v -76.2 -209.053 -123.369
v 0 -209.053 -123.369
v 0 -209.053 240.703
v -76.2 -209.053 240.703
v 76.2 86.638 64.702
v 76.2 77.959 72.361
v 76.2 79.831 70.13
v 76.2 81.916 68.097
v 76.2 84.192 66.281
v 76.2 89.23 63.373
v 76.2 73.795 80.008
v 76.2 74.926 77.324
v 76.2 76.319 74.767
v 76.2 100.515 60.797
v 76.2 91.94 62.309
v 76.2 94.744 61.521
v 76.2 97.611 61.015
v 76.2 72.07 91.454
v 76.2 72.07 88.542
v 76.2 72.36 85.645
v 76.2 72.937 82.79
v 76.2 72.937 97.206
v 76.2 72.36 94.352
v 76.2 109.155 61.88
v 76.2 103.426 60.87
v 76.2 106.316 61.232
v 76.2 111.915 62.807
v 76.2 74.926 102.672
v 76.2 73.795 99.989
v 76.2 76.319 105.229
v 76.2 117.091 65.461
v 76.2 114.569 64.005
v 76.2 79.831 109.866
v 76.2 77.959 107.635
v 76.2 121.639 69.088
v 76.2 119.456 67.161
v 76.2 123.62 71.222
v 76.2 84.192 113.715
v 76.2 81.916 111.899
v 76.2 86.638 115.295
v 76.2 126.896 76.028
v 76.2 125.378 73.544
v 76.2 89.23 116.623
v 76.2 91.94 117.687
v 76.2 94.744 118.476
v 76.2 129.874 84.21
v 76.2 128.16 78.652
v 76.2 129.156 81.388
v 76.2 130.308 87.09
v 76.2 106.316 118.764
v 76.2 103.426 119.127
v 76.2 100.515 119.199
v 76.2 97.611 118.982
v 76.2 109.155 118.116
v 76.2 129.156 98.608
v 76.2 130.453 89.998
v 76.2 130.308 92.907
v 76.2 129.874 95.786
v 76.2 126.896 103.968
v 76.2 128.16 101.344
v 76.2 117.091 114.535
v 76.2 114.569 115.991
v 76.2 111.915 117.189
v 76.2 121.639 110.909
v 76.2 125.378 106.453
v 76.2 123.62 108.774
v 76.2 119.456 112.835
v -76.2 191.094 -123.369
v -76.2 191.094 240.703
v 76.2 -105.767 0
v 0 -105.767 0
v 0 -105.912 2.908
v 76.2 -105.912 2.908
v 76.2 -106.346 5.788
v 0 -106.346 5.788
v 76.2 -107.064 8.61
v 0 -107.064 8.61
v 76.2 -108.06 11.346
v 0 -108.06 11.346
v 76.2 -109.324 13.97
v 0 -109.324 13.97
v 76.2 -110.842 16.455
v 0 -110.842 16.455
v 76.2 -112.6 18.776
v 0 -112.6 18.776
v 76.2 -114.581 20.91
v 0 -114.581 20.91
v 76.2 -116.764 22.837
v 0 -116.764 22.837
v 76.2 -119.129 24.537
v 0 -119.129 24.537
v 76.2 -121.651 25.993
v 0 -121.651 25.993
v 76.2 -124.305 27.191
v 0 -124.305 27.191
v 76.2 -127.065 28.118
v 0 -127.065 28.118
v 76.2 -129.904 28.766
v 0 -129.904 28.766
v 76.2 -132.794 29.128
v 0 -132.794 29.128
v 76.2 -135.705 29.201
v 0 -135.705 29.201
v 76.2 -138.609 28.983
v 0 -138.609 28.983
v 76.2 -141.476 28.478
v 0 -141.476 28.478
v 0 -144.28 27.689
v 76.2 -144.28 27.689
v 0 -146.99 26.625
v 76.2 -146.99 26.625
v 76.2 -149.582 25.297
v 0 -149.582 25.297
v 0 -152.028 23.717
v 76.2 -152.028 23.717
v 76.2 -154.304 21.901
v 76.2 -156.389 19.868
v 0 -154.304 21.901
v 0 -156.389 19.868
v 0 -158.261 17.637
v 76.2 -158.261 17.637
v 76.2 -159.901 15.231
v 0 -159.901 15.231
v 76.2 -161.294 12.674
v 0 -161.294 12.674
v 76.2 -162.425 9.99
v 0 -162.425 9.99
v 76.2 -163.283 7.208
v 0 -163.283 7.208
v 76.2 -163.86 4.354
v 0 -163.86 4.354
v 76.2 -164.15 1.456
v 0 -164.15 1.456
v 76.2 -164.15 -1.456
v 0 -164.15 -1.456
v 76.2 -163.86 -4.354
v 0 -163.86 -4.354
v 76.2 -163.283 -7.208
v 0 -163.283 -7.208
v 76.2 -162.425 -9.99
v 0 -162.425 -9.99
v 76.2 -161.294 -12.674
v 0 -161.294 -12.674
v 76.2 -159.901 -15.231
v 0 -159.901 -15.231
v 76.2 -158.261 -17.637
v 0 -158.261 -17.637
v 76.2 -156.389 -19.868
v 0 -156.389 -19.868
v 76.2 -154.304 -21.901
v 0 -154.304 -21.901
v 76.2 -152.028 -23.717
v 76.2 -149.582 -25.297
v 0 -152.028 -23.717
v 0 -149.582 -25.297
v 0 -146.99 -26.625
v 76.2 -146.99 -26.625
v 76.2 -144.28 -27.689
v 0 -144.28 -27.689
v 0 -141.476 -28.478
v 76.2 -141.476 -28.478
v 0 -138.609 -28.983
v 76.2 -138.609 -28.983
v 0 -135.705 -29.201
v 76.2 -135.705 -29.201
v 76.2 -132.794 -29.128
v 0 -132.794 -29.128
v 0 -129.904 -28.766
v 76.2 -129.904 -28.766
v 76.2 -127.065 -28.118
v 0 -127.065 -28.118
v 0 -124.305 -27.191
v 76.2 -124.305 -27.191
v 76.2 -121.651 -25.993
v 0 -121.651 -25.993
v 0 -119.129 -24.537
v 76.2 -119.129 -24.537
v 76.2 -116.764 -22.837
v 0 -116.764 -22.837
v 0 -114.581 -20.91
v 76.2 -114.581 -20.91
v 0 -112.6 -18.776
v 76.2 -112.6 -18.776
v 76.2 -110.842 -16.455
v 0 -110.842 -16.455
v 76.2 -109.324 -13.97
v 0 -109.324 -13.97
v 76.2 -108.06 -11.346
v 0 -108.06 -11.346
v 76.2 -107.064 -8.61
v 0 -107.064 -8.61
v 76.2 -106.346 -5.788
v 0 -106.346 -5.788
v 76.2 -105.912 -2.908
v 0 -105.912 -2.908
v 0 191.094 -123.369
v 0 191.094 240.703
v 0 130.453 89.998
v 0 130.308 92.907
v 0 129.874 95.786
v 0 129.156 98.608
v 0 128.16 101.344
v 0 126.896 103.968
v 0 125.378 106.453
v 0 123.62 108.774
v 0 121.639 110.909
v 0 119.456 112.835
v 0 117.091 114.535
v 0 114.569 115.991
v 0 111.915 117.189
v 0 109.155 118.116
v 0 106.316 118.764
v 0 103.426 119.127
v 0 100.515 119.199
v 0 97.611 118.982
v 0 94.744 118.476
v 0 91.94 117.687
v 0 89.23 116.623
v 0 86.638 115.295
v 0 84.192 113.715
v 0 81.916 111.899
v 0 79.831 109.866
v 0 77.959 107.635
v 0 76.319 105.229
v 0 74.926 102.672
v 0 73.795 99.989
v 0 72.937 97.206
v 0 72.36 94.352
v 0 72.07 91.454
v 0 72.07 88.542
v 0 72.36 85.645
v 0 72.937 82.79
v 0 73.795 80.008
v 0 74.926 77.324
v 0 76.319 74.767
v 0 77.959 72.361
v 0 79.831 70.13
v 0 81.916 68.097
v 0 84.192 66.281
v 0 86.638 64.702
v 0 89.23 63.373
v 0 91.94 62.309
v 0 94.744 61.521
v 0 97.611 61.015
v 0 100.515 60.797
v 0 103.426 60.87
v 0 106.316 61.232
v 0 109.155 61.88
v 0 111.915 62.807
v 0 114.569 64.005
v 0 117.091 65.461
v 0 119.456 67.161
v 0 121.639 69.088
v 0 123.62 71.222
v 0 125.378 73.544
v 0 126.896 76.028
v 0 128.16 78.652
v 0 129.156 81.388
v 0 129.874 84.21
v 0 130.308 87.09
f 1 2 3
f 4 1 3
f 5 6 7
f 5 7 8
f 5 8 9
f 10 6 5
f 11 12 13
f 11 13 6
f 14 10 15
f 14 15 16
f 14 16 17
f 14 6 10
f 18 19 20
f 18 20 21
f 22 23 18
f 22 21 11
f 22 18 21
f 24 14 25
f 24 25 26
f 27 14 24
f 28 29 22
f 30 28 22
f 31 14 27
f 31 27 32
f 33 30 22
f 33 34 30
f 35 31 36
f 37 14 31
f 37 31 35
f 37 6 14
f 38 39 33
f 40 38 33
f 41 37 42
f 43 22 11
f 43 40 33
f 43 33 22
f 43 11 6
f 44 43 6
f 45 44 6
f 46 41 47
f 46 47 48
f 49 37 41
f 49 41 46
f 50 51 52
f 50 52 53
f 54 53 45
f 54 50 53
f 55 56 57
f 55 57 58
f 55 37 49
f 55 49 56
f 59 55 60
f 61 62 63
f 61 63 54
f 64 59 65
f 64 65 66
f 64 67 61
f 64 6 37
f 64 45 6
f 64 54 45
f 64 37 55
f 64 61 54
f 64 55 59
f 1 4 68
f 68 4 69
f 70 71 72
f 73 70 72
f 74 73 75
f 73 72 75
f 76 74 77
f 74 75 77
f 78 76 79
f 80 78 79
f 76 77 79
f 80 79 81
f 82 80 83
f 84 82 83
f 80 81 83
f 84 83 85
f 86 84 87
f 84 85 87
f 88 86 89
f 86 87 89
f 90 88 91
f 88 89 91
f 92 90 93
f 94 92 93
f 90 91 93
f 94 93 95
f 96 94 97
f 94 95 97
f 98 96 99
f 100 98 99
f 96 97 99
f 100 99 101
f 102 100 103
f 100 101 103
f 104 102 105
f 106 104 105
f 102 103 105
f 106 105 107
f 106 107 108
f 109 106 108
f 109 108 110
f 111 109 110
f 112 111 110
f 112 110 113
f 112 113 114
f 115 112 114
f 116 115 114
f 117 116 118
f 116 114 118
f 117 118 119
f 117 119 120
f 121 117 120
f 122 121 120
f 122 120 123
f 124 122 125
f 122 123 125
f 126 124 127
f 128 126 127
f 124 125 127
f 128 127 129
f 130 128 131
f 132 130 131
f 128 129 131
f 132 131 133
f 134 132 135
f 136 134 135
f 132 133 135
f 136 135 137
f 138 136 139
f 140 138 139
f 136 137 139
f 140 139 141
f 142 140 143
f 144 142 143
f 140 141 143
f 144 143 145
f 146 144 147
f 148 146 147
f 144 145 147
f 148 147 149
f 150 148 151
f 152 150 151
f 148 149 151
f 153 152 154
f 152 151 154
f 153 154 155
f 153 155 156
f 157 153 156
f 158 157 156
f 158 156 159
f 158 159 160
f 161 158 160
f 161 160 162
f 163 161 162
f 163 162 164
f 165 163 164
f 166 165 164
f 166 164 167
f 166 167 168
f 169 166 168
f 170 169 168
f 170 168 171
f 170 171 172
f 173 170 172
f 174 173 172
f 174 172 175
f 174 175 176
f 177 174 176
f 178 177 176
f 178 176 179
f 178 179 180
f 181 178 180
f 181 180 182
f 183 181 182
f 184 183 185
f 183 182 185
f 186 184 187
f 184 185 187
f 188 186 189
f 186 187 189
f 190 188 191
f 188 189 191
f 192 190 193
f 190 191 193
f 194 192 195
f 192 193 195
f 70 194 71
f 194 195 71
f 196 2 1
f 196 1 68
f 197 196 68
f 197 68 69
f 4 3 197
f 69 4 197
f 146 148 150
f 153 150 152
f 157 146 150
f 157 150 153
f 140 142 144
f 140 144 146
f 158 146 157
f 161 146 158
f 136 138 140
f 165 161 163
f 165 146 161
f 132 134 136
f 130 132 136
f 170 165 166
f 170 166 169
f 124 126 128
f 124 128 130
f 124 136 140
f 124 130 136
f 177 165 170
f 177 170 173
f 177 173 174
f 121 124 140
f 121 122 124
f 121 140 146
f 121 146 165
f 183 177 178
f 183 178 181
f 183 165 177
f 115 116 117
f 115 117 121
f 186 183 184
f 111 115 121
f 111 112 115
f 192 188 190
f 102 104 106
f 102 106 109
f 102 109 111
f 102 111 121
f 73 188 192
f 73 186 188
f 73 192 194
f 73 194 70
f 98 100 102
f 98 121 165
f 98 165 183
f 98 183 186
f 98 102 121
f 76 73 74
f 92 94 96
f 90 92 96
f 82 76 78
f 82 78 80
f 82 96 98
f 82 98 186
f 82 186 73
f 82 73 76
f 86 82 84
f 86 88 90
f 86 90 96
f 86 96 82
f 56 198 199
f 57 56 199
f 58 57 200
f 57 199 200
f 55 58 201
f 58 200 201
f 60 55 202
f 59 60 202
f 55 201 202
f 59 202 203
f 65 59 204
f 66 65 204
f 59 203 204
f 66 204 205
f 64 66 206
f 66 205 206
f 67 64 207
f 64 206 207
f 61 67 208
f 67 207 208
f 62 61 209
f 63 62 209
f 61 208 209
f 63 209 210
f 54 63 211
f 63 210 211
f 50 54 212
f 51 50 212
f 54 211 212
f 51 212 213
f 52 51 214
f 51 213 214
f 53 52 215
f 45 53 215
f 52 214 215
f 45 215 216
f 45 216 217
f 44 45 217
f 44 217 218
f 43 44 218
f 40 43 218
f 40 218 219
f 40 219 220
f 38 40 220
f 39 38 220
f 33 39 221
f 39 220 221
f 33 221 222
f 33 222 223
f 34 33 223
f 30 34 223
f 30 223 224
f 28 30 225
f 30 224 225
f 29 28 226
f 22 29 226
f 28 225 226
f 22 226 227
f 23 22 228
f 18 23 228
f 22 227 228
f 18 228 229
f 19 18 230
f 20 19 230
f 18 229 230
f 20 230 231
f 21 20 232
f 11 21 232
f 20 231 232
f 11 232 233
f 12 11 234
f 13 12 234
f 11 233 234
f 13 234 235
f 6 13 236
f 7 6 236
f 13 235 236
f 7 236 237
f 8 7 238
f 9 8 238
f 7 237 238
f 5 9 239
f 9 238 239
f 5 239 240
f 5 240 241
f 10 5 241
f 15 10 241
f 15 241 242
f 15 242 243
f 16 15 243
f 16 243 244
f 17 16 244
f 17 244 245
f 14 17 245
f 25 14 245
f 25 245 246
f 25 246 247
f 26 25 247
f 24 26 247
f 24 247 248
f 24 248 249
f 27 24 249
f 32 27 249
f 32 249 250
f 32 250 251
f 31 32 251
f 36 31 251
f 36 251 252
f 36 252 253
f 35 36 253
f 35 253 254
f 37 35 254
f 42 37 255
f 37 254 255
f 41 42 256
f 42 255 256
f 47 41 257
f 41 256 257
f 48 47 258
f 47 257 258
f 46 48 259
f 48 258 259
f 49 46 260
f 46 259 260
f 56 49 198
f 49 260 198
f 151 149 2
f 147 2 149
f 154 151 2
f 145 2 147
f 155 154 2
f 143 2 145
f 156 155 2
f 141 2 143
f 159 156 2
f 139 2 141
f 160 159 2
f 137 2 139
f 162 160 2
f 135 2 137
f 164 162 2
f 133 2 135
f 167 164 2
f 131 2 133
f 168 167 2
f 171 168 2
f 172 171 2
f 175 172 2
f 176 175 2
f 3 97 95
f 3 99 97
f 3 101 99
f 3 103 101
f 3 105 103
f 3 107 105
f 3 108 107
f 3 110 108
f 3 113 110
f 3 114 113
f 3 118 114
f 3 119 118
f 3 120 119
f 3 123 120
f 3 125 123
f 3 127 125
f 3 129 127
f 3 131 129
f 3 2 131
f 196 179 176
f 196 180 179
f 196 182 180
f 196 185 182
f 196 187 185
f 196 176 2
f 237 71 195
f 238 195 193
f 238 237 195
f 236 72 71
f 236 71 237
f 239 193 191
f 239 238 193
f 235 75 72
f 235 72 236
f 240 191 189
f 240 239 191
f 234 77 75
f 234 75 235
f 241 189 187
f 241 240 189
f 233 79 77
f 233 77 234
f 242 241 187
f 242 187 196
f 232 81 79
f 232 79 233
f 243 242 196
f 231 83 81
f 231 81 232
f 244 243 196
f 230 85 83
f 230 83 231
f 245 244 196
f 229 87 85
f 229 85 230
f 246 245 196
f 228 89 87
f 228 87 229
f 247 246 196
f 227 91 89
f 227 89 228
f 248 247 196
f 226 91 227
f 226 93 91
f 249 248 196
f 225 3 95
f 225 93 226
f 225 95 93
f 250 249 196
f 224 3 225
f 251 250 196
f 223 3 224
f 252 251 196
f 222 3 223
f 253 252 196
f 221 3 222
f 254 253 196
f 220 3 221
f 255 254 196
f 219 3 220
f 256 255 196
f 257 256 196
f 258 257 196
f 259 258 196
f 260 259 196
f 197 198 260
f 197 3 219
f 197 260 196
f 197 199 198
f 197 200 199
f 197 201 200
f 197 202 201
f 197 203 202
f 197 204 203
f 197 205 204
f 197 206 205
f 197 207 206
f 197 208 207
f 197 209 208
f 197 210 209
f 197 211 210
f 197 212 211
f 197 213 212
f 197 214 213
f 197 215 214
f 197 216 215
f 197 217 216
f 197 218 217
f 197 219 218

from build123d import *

# Parameters (mm, degrees)
F0_W     = 400.146693
F0_H     = 364.072472
F2_DEPTH = 76.2
F1_R     = 29.21
F3_DEPTH = 76.2


with BuildPart() as f2:
    # F0 (on Right) → F2 (new body)
    with BuildSketch(Plane.YZ):
        with Locations((-8.979843, 58.667138)):
            Rectangle(F0_W, F0_H)
    extrude(amount=-F2_DEPTH)

    # F1 (on face) → F3 (join)
    with BuildSketch(Plane.YZ):
        with Locations((-134.976578, 0)):
            Circle(F1_R)
        with Locations((101.243422, 89.998201)):
            Circle(F1_R)
    extrude(amount=F3_DEPTH)


solid = f2.part
